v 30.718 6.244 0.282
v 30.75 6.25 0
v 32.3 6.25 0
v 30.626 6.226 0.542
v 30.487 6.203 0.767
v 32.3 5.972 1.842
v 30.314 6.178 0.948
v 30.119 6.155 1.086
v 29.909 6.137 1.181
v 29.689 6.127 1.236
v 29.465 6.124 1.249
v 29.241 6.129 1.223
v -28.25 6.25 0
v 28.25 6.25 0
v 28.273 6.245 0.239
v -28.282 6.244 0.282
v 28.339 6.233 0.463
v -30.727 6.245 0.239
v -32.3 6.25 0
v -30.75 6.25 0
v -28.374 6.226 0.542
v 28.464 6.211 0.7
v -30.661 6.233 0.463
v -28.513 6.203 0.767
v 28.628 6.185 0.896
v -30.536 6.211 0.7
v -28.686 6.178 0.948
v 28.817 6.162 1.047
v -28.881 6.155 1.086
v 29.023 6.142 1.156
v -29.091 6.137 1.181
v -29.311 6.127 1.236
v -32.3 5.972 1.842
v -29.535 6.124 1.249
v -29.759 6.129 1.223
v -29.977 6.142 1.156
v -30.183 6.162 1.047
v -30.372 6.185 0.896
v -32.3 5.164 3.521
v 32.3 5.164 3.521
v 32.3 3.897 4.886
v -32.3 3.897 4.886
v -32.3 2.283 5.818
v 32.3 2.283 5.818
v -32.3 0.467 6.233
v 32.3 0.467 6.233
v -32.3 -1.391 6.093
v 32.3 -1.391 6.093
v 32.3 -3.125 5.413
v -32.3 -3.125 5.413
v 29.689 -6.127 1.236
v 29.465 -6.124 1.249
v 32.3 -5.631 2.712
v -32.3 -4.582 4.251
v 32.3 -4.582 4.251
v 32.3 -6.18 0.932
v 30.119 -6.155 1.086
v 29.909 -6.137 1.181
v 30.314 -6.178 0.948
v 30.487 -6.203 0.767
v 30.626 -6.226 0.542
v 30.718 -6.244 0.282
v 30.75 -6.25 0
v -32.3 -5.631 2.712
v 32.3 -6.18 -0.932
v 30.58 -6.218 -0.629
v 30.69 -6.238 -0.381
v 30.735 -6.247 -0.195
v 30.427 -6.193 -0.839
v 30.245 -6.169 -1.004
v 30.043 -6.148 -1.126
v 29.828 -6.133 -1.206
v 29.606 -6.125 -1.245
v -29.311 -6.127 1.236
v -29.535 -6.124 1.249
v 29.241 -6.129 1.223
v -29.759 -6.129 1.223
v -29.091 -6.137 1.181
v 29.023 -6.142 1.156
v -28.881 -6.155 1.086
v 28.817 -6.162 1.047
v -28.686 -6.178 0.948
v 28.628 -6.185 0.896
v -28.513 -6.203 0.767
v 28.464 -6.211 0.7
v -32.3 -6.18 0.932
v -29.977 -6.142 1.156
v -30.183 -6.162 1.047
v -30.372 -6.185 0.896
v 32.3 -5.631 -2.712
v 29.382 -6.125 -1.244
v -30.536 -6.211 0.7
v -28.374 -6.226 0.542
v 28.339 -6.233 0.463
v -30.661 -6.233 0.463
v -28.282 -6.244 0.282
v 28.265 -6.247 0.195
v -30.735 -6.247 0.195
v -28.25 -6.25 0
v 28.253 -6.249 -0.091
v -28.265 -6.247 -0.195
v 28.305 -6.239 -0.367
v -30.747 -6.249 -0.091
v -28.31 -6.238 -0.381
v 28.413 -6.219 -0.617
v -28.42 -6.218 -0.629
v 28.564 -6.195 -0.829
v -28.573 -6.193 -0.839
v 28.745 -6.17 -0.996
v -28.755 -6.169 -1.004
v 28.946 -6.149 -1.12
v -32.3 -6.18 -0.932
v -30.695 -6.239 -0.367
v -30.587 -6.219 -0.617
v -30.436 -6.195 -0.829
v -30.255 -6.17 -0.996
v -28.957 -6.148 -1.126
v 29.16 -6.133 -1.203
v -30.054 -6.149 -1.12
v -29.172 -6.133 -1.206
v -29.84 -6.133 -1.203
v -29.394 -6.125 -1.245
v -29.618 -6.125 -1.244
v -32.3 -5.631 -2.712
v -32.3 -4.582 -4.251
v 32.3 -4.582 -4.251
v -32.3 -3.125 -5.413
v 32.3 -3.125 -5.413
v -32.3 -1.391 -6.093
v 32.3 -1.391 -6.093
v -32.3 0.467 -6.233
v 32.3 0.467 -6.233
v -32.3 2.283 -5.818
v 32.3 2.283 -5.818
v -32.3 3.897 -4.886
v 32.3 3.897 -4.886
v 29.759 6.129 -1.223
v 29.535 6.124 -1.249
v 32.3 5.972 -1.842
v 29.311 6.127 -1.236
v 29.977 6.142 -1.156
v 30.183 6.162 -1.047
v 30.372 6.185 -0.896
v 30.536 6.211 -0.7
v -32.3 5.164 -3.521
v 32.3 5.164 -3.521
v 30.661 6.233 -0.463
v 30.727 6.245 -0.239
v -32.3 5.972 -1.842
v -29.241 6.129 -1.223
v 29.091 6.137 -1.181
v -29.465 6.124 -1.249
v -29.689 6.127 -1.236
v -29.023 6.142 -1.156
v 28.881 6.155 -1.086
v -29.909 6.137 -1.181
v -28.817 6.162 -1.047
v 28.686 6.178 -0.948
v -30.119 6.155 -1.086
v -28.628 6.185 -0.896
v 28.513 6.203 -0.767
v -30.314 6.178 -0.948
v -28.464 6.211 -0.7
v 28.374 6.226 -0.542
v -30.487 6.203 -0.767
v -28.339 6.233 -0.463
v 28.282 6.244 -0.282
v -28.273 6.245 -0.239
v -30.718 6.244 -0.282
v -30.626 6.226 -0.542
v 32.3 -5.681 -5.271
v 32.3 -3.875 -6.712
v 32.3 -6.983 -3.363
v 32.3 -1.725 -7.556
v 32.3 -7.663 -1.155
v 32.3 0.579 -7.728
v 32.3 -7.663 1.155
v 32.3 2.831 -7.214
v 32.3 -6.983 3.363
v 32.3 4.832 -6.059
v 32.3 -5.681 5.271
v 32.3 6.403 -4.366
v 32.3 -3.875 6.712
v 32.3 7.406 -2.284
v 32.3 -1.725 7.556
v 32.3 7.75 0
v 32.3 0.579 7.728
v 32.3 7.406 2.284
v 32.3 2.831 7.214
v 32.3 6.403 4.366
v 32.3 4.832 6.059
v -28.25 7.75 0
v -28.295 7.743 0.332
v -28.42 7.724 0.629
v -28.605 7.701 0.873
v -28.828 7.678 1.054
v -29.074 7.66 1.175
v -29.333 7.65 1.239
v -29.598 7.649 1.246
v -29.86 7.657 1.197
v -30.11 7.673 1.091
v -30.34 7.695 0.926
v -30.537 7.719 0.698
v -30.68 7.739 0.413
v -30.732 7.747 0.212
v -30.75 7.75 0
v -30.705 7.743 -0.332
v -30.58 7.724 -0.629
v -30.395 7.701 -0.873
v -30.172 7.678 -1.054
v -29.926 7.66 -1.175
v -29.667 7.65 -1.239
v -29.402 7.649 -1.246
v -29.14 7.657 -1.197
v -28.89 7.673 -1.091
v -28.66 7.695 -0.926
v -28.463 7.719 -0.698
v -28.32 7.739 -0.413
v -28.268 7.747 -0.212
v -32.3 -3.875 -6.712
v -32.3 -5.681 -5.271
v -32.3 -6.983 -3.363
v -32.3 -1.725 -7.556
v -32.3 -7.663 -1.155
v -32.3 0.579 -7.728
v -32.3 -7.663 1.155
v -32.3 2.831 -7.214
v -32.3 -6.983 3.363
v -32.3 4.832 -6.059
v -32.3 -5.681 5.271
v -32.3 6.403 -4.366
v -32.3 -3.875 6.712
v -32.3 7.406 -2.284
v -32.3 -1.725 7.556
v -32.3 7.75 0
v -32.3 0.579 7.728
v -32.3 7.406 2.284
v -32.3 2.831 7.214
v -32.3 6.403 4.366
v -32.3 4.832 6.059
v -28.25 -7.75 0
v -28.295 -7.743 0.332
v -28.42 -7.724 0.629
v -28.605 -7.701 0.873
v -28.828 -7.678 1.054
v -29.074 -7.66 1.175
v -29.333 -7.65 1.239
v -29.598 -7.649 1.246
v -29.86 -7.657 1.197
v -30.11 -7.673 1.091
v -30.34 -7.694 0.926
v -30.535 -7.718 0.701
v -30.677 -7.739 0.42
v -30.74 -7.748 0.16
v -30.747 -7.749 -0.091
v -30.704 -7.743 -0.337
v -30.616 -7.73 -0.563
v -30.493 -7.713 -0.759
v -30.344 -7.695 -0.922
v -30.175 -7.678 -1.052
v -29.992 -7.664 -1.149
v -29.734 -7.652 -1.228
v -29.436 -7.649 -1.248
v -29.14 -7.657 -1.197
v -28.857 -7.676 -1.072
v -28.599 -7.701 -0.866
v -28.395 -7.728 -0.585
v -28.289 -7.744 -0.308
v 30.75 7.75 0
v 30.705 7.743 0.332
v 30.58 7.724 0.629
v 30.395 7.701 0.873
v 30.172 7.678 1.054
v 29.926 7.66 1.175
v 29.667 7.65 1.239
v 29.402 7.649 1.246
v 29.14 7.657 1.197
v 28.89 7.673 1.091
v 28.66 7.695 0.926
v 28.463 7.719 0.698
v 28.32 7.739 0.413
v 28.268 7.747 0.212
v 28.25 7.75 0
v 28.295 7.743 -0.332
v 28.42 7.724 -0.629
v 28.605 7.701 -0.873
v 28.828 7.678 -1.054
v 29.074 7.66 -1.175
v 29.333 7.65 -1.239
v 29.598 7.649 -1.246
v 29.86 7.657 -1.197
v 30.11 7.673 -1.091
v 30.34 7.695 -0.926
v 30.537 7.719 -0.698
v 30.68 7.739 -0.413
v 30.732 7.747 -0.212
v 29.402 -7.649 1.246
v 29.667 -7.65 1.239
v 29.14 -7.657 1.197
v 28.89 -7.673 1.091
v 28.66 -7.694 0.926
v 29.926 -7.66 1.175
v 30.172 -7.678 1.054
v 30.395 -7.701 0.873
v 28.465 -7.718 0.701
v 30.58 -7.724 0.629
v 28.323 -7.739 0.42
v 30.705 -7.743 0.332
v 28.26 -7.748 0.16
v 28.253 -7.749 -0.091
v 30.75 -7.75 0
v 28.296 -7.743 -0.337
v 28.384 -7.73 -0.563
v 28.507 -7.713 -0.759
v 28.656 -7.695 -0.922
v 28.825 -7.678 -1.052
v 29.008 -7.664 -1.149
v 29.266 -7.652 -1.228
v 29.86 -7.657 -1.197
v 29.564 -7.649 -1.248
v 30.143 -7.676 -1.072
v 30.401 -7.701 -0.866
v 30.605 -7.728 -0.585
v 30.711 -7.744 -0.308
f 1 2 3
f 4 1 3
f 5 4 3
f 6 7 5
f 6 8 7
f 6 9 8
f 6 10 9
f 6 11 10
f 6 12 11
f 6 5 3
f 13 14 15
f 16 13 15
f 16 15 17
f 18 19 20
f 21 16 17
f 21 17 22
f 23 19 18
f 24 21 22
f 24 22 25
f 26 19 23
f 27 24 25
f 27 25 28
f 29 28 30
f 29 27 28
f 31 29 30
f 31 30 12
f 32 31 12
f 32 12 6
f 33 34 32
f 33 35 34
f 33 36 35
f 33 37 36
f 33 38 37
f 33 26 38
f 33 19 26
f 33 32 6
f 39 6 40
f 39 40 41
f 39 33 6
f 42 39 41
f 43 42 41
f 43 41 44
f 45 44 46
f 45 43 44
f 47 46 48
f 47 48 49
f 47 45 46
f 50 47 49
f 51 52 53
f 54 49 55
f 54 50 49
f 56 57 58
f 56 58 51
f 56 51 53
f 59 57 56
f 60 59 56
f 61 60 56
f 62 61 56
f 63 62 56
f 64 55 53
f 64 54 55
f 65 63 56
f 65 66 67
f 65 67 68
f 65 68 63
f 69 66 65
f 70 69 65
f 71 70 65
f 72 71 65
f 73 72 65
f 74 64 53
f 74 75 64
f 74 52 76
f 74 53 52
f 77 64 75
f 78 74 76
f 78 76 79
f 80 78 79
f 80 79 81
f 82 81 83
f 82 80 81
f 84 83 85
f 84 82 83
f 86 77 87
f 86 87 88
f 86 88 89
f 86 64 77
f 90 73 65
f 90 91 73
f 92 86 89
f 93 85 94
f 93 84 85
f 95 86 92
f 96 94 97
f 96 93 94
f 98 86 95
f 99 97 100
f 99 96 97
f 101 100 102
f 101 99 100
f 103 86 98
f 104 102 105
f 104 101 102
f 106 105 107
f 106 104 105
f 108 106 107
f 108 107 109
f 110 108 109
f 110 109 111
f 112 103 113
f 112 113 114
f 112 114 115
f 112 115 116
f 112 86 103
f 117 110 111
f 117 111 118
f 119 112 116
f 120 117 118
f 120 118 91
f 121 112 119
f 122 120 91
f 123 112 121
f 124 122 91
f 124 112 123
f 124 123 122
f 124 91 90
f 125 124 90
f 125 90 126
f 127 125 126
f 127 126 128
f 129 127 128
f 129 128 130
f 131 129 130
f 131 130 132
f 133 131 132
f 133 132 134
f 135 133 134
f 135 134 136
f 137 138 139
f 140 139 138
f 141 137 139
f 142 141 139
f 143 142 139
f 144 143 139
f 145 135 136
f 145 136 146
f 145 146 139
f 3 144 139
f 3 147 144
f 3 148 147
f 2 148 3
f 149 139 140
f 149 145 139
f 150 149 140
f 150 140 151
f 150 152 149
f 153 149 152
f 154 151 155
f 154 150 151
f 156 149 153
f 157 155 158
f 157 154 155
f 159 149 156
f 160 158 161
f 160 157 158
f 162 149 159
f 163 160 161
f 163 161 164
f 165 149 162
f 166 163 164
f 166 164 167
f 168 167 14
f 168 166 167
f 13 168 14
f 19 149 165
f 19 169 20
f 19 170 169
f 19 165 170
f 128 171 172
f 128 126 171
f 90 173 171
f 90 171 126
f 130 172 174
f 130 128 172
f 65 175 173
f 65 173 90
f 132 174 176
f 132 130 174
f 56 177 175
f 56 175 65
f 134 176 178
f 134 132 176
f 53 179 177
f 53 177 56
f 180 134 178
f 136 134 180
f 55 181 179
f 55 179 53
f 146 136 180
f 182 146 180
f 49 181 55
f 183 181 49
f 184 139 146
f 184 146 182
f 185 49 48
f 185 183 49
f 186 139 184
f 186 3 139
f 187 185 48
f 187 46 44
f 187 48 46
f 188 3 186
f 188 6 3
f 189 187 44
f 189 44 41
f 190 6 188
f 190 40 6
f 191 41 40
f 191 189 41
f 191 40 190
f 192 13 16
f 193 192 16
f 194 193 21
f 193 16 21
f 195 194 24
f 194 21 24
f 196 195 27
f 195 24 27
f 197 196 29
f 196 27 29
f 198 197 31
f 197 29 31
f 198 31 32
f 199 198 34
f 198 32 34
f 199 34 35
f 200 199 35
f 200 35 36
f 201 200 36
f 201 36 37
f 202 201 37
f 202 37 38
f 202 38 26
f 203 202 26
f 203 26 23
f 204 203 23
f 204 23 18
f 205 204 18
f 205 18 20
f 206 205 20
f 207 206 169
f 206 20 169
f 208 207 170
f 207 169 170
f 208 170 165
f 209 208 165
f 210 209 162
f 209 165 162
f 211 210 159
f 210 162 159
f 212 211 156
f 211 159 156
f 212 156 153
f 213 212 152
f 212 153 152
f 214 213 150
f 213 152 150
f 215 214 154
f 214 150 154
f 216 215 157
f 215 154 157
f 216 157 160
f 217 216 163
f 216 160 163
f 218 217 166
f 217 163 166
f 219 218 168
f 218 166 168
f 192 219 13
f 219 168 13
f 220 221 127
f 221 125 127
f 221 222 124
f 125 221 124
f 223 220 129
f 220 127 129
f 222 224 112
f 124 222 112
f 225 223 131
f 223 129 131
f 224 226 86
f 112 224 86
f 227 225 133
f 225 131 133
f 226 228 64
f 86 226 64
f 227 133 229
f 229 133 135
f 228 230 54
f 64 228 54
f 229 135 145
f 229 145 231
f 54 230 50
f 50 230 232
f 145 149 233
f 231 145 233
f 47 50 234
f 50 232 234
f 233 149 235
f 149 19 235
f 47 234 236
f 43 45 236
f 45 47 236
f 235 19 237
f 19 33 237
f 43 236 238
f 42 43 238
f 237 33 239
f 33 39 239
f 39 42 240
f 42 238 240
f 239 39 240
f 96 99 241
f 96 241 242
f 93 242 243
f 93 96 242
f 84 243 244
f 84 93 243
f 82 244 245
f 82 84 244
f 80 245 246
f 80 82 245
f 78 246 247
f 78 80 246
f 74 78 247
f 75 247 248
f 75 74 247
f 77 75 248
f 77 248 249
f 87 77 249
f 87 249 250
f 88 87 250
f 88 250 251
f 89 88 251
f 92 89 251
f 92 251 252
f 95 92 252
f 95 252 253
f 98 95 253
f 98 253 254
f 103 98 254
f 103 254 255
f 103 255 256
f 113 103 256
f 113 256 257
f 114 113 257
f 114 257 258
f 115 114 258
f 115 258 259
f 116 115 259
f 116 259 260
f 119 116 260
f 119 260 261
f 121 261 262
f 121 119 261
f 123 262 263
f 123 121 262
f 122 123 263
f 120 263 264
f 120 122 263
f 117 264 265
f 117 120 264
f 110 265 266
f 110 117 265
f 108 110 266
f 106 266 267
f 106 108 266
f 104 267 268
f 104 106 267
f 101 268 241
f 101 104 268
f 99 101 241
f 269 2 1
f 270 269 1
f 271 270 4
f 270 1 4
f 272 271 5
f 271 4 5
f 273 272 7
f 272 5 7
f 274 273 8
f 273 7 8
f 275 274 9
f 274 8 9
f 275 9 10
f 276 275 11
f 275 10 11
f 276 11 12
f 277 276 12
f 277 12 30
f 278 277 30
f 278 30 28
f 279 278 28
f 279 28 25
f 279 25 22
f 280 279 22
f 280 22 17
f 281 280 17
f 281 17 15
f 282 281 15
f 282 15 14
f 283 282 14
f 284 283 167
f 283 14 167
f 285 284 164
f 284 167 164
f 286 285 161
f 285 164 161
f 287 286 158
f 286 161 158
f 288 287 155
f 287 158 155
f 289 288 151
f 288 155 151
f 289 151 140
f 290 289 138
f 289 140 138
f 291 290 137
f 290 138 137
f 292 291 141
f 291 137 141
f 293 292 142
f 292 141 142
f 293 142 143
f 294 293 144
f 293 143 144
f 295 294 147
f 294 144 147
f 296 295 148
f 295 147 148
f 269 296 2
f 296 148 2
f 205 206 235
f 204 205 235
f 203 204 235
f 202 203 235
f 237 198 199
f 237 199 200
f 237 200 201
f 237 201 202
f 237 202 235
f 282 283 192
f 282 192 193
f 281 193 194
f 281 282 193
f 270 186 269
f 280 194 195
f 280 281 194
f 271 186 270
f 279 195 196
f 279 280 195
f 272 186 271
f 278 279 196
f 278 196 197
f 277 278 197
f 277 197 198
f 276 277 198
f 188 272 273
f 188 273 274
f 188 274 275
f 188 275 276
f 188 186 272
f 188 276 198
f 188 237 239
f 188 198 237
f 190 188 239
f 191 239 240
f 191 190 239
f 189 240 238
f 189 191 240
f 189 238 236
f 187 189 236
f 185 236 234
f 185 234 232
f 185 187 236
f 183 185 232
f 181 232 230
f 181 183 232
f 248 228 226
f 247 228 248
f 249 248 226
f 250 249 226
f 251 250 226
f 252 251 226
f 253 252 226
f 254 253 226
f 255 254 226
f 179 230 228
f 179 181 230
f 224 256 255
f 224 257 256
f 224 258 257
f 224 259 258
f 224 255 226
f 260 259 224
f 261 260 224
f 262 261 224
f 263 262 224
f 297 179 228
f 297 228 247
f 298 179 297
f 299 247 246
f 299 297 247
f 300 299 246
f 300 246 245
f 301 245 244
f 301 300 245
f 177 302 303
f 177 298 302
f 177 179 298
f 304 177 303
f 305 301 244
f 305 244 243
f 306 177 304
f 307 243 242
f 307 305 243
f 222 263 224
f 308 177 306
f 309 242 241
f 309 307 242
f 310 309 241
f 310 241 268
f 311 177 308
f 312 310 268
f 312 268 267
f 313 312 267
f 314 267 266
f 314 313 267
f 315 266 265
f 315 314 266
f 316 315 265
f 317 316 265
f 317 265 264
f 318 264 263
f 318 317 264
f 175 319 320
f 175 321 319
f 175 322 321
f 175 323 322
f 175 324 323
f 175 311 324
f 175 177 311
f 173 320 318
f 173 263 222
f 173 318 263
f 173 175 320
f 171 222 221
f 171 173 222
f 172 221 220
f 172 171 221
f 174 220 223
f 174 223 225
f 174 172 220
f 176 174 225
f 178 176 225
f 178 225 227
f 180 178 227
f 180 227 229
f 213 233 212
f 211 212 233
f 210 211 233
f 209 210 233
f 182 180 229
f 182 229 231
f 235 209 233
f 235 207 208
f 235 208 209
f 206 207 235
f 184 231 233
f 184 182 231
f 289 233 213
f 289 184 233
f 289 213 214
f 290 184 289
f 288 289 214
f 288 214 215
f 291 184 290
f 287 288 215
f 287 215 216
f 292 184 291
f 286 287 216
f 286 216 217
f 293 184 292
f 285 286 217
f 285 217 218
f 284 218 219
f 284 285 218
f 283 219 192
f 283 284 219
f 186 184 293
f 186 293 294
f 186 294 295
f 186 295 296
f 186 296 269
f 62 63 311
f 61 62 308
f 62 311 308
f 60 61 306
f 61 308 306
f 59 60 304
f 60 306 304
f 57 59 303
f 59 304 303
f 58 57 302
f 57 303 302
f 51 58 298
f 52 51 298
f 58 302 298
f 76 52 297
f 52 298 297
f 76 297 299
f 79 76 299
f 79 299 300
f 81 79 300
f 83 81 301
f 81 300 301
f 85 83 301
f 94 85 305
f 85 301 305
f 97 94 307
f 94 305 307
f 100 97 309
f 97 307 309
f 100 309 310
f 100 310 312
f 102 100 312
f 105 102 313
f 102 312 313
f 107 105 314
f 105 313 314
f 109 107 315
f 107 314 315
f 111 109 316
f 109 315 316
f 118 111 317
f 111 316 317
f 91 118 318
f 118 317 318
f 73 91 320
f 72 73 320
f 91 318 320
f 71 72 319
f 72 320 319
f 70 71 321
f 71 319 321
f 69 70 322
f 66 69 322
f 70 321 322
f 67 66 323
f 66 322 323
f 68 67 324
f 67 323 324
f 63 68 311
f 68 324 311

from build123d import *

# Parameters (mm, degrees)
F0_R     = 7.75
F0_R_2   = 6.25
F1_DEPTH = 32.3
F2_R     = 1.25
F3_DEPTH = 12.5


with BuildPart() as f1:
    # F0 (on Right) → F1 (new body, symmetric)
    with BuildSketch(Plane.YZ):
        Circle(F0_R)
        Circle(F0_R_2, mode=Mode.SUBTRACT)
    extrude(amount=F1_DEPTH, both=True)

    # F2 (on Front) → F3 (cut, symmetric)
    with BuildSketch(Plane.XZ):
        with Locations((-29.5, 0)):
            Circle(F2_R)
        with Locations((29.5, 0)):
            Circle(F2_R)
    extrude(amount=F3_DEPTH, both=True, mode=Mode.SUBTRACT)


solid = f1.part
